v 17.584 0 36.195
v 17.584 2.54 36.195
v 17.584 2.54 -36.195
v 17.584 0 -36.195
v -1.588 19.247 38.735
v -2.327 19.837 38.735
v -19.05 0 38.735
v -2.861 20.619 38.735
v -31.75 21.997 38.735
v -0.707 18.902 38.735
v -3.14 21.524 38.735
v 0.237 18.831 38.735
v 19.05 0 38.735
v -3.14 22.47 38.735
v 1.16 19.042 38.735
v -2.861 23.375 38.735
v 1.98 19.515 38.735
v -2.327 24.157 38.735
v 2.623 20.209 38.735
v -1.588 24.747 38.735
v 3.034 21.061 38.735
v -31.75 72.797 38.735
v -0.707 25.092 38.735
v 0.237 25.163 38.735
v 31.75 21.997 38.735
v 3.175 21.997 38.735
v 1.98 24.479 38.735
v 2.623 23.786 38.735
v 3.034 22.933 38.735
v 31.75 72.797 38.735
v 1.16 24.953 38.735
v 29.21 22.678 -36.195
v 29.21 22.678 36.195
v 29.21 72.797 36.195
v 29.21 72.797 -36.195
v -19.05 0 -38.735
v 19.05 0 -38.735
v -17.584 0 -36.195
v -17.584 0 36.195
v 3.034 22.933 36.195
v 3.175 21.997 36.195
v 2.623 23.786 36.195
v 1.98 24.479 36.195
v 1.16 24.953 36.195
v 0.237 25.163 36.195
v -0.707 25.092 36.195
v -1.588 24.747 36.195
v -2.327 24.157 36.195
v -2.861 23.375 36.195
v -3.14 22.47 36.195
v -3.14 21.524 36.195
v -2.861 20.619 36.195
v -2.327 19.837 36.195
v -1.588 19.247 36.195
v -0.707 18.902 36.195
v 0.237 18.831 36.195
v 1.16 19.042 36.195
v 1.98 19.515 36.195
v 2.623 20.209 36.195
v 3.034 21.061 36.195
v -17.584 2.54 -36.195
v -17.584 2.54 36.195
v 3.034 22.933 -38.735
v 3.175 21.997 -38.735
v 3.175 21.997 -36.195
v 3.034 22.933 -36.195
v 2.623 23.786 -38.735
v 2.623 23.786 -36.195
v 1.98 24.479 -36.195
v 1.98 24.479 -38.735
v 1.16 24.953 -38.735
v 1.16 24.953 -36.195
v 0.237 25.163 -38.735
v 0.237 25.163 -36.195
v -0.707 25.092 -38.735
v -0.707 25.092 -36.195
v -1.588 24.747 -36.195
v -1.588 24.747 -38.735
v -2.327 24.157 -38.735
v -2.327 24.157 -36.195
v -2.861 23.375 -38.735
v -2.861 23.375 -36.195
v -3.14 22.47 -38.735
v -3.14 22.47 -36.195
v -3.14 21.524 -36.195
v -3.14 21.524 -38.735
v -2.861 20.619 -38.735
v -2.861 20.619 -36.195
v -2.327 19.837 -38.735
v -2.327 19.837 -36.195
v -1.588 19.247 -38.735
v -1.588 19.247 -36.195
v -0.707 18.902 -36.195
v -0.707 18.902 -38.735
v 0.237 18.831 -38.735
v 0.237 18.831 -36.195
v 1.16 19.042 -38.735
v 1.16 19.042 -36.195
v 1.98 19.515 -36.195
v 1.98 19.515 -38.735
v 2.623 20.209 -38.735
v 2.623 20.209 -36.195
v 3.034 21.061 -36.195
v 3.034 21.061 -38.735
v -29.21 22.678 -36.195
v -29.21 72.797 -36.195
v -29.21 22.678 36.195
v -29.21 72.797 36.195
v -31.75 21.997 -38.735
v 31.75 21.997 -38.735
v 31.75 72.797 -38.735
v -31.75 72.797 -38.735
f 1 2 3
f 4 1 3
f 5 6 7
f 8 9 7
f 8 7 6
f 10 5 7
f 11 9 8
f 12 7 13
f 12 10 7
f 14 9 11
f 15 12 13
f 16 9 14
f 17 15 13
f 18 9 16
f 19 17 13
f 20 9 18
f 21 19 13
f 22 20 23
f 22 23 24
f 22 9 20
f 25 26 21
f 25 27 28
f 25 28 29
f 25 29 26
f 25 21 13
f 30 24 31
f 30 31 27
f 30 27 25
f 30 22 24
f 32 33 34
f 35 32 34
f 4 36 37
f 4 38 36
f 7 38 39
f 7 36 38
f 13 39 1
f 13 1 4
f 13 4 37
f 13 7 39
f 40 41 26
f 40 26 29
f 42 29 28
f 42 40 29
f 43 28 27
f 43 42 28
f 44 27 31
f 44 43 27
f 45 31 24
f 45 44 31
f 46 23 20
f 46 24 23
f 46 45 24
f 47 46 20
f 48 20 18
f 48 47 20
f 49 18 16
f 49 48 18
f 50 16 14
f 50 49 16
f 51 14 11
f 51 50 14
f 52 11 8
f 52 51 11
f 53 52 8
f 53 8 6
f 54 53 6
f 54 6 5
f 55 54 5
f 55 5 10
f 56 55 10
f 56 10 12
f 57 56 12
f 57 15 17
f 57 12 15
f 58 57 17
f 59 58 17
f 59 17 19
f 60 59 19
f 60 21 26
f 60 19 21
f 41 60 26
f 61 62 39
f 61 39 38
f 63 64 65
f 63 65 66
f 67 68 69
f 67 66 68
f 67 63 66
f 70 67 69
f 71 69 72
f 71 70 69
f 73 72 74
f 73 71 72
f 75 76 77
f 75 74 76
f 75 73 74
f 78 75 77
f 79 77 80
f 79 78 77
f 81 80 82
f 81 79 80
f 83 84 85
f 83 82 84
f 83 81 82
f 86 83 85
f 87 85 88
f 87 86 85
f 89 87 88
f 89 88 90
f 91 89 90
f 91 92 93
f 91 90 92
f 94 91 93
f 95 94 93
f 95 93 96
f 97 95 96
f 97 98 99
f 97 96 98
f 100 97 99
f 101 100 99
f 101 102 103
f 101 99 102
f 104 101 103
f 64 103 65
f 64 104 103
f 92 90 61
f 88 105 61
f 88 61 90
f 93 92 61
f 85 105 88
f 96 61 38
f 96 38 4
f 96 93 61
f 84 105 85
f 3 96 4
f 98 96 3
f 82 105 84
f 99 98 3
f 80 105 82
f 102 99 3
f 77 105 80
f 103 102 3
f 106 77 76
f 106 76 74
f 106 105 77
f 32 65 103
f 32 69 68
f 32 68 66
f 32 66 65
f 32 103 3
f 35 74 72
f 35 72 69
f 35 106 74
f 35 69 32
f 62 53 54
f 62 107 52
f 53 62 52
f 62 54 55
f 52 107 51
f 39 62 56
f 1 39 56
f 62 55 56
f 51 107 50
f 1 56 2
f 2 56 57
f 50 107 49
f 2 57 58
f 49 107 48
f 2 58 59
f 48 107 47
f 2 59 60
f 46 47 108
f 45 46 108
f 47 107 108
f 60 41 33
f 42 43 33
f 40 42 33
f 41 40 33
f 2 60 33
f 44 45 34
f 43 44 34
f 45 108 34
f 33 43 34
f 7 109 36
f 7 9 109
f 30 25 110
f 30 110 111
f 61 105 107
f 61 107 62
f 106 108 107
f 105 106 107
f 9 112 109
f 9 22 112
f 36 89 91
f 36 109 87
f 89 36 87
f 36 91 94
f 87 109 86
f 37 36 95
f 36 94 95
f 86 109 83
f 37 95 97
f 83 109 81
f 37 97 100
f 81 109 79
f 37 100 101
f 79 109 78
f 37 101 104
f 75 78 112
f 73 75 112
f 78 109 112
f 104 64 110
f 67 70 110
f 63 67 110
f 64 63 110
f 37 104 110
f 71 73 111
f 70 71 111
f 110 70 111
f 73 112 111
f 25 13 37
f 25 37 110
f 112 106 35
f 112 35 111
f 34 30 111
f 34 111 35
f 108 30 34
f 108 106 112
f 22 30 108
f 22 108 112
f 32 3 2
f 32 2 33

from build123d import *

# Parameters (mm, degrees)
BOSS_EXTRUDE1_DEPTH     = 38.735
SHELL1_T                = -2.54
SKETCH4_W               = 35.167060632
SKETCH4_H               = 72.39
CUT_EXTRUDE1_DEPTH      = 87.281603677
CUT_EXTRUDE2_DEPTH      = 111.946262659
CUT_EXTRUDE2_DEPTH_BACK = 111.946262659
SKETCH6_R               = 3.175


with BuildPart() as part:
    # Sketch1 → Boss-Extrude1 (new, symmetric)
    with BuildSketch(Plane.XY):
        Polygon((-19.05, 0), (19.05, 0), (31.75, 21.997045256), (31.75, 72.797045256), (-31.75, 72.797045256), (-31.75, 21.997045256), align=None)
    extrude(amount=BOSS_EXTRUDE1_DEPTH, both=True)

    # Shell1
    shell1_openings = [part.faces().sort_by_distance(p)[0] for p in [
        (0, 72.797045256, 0),
    ]]
    offset(amount=SHELL1_T, openings=shell1_openings, kind=Kind.INTERSECTION)

    # Sketch4 → Cut-Extrude1 (cut, through all)
    with BuildSketch(Plane(origin=(0, 2.54, 0), x_dir=(1, 0, 0), z_dir=(0, 1, 0))):
        Rectangle(SKETCH4_W, SKETCH4_H)
    extrude(amount=-CUT_EXTRUDE1_DEPTH, mode=Mode.SUBTRACT)

    # Sketch6 → Cut-Extrude2 (cut, two sides: drawn at the far end of the back side and taken through both)
    with BuildSketch(Plane.XY.offset(38.735).offset(-CUT_EXTRUDE2_DEPTH_BACK)):
        with Locations((0, 21.997045256)):
            Circle(SKETCH6_R)
    extrude(amount=CUT_EXTRUDE2_DEPTH + CUT_EXTRUDE2_DEPTH_BACK, mode=Mode.SUBTRACT)


solid = part.part
